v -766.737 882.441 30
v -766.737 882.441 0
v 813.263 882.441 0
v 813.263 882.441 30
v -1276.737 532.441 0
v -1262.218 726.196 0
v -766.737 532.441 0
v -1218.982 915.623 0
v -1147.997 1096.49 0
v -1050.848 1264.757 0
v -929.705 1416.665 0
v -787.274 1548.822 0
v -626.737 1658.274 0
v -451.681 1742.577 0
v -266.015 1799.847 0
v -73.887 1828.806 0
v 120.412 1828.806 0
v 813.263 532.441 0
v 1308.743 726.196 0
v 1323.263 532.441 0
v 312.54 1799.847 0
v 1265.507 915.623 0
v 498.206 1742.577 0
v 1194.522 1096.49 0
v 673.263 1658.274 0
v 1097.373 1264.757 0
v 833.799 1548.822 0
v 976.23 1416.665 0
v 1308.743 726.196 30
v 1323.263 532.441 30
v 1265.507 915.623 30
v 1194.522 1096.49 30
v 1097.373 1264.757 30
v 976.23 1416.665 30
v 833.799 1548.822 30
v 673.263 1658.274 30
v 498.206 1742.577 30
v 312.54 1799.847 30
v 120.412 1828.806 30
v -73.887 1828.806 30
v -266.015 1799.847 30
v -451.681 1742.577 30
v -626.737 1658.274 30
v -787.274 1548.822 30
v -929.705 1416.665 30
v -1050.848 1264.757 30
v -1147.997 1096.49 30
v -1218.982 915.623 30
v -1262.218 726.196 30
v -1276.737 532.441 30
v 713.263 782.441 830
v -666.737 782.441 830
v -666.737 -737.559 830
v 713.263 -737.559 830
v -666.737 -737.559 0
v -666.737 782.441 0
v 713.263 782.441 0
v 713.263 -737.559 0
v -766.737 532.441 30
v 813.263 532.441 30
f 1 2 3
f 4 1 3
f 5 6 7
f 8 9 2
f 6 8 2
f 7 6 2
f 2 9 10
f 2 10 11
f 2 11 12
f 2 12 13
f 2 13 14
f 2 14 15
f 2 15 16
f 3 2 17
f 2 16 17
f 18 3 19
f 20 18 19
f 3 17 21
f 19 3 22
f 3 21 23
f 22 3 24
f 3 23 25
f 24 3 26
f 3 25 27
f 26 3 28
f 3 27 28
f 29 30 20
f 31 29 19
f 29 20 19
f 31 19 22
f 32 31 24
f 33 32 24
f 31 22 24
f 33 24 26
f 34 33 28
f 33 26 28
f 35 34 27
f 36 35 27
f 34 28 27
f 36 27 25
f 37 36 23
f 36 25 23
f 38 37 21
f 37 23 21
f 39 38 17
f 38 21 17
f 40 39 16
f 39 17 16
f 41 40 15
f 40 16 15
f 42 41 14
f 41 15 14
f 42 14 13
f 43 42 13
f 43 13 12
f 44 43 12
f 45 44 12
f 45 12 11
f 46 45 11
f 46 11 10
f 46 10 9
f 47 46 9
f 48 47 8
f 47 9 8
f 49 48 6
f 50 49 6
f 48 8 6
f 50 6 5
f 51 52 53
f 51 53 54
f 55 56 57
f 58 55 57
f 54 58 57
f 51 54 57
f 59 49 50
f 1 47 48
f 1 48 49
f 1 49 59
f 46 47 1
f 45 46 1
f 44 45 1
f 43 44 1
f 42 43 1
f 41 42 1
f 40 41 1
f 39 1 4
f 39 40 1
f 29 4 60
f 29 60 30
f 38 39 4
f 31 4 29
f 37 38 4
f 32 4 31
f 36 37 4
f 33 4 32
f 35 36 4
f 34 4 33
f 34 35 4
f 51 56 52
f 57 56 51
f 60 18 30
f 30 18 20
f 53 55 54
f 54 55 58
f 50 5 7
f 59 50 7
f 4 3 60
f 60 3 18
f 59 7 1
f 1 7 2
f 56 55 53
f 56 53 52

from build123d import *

# Parameters (mm, degrees)
SKETCH2_W           = 1380
SKETCH2_H           = 1520
BOSS_EXTRUDE3_DEPTH = 830
BOSS_EXTRUDE4_DEPTH = 30


with BuildPart() as part:
    # Sketch2 → Boss-Extrude3 (new body)
    with BuildSketch(Plane.XY):
        with Locations((23.262557024, 22.44080113)):
            Rectangle(SKETCH2_W, SKETCH2_H)
    extrude(amount=BOSS_EXTRUDE3_DEPTH)


with BuildPart() as body_2:
    # Sketch3 → Boss-Extrude4 (new body)
    with BuildSketch(Plane.XY):
        with BuildLine():
            ThreePointArc((1323.262557024, 532.44080113), (23.262557024, 1832.44080113), (-1276.737442976, 532.44080113))
            Line((-1276.737442976, 532.44080113), (-766.737442976, 532.44080113))
            Line((-766.737442976, 532.44080113), (-766.737442976, 882.44080113))
            Line((-766.737442976, 882.44080113), (813.262557024, 882.44080113))
            Line((813.262557024, 882.44080113), (813.262557024, 532.44080113))
            Line((813.262557024, 532.44080113), (1323.262557024, 532.44080113))
        make_face()
    extrude(amount=BOSS_EXTRUDE4_DEPTH)


solid = Compound([part.part, body_2.part])
